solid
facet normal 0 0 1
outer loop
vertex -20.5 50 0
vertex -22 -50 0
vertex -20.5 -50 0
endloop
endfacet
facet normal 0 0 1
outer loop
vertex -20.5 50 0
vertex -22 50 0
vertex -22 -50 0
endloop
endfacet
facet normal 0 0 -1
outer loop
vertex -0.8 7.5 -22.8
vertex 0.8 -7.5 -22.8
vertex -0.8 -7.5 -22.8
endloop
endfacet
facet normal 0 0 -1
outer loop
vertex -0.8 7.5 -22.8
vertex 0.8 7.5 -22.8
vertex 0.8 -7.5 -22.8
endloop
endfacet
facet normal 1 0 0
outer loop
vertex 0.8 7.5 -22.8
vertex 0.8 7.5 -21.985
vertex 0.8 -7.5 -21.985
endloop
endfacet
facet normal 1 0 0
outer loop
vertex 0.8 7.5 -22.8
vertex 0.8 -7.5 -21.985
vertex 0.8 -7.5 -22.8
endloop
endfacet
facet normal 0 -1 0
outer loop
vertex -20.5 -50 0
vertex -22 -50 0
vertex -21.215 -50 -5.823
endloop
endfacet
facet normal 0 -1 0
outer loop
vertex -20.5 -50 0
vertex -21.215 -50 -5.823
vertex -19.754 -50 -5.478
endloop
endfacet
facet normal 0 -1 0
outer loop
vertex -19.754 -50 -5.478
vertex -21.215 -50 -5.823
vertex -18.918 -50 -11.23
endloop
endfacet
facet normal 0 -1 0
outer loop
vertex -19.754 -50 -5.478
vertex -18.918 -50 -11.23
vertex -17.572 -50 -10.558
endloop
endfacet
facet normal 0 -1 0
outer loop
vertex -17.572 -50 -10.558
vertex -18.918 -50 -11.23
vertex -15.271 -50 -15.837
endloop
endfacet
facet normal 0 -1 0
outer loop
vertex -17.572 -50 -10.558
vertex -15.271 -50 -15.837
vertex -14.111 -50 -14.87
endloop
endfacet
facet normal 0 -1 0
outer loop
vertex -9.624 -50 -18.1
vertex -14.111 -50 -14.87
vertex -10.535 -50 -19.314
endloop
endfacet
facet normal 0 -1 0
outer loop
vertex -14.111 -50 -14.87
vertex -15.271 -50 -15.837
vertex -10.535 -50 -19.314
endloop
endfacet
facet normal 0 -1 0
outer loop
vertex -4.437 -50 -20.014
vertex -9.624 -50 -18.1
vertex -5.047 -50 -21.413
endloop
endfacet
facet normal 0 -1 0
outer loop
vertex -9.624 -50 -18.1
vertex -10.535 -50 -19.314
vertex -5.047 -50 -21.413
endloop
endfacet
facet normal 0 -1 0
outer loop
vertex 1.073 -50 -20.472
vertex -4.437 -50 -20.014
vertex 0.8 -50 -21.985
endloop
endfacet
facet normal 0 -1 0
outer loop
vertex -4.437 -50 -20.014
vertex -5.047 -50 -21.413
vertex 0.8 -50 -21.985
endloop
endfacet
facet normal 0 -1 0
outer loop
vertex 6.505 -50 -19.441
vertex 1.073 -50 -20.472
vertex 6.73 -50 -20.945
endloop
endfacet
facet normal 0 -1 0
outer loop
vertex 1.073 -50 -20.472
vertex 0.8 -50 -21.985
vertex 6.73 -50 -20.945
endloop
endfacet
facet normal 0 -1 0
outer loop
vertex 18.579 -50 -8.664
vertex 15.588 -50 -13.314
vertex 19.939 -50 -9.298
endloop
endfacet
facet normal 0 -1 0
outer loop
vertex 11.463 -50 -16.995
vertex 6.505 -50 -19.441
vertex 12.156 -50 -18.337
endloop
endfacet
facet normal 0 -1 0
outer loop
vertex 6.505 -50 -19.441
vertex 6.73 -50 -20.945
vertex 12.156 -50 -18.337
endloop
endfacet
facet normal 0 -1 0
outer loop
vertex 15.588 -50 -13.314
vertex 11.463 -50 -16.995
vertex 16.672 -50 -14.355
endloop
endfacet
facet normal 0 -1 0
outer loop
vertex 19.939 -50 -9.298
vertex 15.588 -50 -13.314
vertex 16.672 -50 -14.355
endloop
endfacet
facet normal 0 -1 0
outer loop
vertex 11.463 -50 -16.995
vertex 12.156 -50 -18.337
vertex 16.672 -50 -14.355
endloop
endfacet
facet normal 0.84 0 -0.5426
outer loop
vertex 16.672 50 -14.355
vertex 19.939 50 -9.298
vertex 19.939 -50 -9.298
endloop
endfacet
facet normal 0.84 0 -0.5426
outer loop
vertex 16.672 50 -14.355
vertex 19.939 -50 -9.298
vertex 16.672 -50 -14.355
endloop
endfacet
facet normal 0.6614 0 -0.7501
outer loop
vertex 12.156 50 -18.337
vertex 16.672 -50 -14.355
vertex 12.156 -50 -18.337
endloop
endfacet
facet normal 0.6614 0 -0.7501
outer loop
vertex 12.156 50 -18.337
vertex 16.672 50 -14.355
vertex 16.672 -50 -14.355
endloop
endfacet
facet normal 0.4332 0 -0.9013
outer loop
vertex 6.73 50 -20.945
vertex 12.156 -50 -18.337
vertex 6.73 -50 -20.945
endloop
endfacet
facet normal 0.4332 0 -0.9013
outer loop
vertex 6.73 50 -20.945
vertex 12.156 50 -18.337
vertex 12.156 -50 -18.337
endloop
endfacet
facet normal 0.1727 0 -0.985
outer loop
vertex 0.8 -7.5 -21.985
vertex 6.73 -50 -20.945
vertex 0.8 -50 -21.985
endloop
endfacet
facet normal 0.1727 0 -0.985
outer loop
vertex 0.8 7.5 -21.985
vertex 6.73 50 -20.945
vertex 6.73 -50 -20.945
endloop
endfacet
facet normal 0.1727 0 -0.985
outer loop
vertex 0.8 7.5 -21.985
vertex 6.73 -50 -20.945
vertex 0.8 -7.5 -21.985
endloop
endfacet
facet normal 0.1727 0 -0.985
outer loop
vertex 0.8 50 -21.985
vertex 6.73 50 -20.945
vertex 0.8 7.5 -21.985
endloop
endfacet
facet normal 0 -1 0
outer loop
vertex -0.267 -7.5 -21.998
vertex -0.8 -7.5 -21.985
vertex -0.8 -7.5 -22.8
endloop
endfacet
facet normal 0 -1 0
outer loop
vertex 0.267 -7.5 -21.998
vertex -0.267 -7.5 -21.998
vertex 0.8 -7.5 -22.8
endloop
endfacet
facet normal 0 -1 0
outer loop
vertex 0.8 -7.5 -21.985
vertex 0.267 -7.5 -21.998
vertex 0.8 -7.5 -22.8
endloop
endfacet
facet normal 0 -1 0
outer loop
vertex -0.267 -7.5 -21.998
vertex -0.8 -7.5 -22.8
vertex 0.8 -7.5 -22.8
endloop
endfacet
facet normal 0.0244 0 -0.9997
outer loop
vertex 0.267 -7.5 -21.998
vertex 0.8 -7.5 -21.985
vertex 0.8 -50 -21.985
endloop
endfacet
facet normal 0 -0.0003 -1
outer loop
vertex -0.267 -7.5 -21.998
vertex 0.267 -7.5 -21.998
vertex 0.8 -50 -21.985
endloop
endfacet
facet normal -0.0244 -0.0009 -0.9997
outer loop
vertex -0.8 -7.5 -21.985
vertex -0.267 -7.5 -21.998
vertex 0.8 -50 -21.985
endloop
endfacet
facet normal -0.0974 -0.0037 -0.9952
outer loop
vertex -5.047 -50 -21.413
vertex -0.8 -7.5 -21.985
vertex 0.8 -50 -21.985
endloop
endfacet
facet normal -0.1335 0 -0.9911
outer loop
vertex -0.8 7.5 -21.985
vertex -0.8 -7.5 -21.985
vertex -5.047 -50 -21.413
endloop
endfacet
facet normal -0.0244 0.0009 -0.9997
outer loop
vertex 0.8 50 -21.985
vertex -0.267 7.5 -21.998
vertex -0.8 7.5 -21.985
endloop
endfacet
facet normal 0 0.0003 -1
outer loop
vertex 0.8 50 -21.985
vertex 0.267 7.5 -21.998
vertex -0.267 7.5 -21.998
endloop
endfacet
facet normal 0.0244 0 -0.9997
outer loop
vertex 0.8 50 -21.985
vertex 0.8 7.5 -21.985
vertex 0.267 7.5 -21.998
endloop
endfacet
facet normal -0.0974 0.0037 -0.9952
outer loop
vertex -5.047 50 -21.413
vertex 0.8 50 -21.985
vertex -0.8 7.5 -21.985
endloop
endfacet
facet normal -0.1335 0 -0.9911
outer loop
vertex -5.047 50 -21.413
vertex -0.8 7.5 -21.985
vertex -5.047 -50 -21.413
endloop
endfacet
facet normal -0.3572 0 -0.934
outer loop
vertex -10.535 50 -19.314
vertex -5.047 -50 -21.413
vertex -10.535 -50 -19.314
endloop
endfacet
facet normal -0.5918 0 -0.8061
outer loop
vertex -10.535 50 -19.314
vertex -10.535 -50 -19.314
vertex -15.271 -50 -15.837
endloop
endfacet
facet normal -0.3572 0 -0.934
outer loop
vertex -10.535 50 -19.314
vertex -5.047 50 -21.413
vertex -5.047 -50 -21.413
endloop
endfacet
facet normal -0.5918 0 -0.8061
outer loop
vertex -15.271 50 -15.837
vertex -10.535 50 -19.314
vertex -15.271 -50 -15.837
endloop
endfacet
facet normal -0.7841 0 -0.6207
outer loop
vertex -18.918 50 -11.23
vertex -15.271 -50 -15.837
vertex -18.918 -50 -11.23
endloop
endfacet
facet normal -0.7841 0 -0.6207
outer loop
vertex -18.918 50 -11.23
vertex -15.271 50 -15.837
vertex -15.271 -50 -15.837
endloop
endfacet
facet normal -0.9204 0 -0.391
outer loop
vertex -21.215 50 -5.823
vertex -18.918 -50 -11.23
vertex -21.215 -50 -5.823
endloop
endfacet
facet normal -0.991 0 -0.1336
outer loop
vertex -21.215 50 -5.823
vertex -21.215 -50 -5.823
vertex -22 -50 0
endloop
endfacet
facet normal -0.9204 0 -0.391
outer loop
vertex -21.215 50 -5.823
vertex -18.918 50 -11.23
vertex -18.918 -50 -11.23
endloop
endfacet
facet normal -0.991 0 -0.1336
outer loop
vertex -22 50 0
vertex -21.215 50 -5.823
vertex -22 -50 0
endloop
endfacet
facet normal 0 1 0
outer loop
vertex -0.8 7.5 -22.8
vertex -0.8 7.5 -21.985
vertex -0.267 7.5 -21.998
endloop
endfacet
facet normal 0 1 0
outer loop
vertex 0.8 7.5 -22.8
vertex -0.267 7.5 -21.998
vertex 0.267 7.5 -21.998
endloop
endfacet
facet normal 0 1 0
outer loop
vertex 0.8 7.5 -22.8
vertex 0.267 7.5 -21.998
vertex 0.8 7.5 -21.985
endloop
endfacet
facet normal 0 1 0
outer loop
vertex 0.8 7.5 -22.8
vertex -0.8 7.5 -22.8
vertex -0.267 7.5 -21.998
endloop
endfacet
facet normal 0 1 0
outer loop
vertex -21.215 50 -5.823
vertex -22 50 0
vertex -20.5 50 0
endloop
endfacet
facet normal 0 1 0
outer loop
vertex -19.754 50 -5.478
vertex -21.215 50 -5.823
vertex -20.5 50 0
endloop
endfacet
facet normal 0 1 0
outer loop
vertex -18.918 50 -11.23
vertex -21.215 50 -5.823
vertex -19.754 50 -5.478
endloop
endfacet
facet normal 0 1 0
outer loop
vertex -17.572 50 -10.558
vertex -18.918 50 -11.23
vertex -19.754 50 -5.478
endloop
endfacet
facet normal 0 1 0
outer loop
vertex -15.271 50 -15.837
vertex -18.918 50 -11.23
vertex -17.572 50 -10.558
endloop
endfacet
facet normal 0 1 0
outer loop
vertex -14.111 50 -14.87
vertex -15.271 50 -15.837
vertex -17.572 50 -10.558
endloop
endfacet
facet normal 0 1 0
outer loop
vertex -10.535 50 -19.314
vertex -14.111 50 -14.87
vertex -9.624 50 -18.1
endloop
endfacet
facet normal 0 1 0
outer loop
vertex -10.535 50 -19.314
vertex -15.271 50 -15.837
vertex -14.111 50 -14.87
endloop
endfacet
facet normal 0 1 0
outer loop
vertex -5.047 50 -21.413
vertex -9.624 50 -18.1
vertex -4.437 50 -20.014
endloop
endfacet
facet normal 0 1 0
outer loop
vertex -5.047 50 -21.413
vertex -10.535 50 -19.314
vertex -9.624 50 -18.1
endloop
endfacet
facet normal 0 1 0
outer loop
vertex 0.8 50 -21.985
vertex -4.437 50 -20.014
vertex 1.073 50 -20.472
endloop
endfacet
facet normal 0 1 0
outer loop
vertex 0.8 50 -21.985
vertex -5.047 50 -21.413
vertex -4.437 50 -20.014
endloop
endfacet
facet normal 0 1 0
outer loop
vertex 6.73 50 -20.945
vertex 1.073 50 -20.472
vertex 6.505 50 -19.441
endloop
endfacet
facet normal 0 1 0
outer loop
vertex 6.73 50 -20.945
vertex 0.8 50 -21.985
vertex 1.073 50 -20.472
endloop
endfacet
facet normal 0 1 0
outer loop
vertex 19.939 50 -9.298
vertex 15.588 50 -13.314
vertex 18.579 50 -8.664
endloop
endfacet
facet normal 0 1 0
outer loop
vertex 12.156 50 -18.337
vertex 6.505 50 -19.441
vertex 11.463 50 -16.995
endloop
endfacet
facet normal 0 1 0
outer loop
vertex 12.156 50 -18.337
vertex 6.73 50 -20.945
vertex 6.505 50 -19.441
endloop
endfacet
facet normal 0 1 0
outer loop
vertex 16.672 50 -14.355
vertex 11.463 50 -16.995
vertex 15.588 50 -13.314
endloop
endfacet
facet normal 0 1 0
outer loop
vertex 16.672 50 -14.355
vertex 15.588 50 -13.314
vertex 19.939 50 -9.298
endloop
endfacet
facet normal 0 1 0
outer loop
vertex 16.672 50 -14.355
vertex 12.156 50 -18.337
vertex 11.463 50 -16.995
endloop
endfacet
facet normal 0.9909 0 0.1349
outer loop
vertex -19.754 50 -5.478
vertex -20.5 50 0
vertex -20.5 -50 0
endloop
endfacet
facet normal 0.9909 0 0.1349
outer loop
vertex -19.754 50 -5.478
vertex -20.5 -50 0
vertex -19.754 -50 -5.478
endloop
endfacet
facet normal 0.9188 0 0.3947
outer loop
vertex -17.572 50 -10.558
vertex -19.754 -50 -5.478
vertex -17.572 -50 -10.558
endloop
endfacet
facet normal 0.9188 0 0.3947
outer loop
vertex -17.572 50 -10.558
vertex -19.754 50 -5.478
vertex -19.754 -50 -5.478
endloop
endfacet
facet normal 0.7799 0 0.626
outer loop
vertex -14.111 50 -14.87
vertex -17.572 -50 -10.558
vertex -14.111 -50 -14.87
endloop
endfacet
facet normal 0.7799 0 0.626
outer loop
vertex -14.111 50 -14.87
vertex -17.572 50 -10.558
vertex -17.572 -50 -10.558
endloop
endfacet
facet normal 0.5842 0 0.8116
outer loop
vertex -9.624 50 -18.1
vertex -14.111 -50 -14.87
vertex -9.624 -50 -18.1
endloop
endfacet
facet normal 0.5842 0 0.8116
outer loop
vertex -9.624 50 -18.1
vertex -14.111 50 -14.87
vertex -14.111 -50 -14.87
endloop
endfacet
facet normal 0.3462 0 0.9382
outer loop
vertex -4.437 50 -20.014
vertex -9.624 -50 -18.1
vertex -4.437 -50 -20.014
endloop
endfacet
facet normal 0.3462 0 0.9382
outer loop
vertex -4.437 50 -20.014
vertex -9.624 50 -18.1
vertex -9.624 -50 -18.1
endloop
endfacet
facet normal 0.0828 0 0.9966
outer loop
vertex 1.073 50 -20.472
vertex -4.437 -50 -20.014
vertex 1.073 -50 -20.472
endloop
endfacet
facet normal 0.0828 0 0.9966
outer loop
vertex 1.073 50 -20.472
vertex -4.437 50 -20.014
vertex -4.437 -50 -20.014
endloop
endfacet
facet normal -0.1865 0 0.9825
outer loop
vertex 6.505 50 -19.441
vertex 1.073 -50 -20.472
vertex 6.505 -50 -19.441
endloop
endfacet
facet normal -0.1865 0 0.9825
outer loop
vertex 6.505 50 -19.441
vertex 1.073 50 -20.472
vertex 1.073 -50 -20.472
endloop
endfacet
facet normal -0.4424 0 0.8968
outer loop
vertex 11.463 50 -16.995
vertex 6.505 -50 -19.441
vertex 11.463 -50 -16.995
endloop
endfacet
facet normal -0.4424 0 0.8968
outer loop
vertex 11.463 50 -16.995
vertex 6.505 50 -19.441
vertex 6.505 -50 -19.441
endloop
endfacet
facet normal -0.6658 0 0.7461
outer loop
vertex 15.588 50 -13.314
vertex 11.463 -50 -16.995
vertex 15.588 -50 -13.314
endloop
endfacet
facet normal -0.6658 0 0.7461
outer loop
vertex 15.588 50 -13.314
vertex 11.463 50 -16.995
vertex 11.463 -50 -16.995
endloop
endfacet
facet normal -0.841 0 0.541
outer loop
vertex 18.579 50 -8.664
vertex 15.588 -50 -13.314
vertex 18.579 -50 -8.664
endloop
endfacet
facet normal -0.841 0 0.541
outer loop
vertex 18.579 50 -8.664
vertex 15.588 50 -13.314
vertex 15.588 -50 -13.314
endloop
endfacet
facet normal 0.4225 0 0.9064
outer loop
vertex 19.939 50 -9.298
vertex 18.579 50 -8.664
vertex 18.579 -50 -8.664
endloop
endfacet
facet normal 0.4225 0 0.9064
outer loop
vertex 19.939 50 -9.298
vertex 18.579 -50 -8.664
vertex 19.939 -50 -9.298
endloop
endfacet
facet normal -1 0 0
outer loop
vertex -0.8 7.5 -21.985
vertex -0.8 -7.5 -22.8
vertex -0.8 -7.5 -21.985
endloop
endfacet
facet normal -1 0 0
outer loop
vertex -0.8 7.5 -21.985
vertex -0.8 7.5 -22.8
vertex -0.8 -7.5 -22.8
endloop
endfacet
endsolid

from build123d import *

# Parameters (mm, degrees)
EXTRUDE_1_DEPTH     = 50
EXTRUDE_2_DEPTH     = 7.5
CUT_EXTRUDE_1_DEPTH = 105.899189701


with BuildPart() as part:
    # 草图1 → 凸台-拉伸1 (new, symmetric)
    with BuildSketch(Plane(origin=(0, 0, 0), x_dir=(1, 0, 0), z_dir=(0, 1, 0))):
        with BuildLine():
            Line((-22, 0), (-20.5, 0))
            ThreePointArc((-20.5, 0), (0, 20.5), (20.5, 0))
            Line((20.5, 0), (22, 0))
            ThreePointArc((22, 0), (15.836666316, 15.270887335), (0.8, 21.985449734))
            ThreePointArc((0.8, 21.985449734), (-15.270887335, 15.836666316), (-22, 0))
        make_face()
    extrude(amount=EXTRUDE_1_DEPTH, both=True)

    # 草图2 → 凸台-拉伸2 (add, symmetric)
    with BuildSketch(Plane(origin=(0, 0, 0), x_dir=(1, 0, 0), z_dir=(0, 1, 0))):
        with BuildLine():
            Line((-0.8, 22.8), (-0.8, 21.985449734))
            ThreePointArc((-0.8, 21.985449734), (0, 22), (0.8, 21.985449734))
            Line((0.8, 21.985449734), (0.8, 22.8))
            Line((0.8, 22.8), (-0.8, 22.8))
        make_face()
    extrude(amount=EXTRUDE_2_DEPTH, both=True)

    # 草图3 → 切除-拉伸1 (cut, through all)
    with BuildSketch(Plane(origin=(0, 50, 0), x_dir=(1, 0, 0), z_dir=(0, 1, 0))):
        Polygon((0, 0), (22, 10.258768479), (22, 0), align=None)
    extrude(amount=-CUT_EXTRUDE_1_DEPTH, mode=Mode.SUBTRACT)


solid = part.part
